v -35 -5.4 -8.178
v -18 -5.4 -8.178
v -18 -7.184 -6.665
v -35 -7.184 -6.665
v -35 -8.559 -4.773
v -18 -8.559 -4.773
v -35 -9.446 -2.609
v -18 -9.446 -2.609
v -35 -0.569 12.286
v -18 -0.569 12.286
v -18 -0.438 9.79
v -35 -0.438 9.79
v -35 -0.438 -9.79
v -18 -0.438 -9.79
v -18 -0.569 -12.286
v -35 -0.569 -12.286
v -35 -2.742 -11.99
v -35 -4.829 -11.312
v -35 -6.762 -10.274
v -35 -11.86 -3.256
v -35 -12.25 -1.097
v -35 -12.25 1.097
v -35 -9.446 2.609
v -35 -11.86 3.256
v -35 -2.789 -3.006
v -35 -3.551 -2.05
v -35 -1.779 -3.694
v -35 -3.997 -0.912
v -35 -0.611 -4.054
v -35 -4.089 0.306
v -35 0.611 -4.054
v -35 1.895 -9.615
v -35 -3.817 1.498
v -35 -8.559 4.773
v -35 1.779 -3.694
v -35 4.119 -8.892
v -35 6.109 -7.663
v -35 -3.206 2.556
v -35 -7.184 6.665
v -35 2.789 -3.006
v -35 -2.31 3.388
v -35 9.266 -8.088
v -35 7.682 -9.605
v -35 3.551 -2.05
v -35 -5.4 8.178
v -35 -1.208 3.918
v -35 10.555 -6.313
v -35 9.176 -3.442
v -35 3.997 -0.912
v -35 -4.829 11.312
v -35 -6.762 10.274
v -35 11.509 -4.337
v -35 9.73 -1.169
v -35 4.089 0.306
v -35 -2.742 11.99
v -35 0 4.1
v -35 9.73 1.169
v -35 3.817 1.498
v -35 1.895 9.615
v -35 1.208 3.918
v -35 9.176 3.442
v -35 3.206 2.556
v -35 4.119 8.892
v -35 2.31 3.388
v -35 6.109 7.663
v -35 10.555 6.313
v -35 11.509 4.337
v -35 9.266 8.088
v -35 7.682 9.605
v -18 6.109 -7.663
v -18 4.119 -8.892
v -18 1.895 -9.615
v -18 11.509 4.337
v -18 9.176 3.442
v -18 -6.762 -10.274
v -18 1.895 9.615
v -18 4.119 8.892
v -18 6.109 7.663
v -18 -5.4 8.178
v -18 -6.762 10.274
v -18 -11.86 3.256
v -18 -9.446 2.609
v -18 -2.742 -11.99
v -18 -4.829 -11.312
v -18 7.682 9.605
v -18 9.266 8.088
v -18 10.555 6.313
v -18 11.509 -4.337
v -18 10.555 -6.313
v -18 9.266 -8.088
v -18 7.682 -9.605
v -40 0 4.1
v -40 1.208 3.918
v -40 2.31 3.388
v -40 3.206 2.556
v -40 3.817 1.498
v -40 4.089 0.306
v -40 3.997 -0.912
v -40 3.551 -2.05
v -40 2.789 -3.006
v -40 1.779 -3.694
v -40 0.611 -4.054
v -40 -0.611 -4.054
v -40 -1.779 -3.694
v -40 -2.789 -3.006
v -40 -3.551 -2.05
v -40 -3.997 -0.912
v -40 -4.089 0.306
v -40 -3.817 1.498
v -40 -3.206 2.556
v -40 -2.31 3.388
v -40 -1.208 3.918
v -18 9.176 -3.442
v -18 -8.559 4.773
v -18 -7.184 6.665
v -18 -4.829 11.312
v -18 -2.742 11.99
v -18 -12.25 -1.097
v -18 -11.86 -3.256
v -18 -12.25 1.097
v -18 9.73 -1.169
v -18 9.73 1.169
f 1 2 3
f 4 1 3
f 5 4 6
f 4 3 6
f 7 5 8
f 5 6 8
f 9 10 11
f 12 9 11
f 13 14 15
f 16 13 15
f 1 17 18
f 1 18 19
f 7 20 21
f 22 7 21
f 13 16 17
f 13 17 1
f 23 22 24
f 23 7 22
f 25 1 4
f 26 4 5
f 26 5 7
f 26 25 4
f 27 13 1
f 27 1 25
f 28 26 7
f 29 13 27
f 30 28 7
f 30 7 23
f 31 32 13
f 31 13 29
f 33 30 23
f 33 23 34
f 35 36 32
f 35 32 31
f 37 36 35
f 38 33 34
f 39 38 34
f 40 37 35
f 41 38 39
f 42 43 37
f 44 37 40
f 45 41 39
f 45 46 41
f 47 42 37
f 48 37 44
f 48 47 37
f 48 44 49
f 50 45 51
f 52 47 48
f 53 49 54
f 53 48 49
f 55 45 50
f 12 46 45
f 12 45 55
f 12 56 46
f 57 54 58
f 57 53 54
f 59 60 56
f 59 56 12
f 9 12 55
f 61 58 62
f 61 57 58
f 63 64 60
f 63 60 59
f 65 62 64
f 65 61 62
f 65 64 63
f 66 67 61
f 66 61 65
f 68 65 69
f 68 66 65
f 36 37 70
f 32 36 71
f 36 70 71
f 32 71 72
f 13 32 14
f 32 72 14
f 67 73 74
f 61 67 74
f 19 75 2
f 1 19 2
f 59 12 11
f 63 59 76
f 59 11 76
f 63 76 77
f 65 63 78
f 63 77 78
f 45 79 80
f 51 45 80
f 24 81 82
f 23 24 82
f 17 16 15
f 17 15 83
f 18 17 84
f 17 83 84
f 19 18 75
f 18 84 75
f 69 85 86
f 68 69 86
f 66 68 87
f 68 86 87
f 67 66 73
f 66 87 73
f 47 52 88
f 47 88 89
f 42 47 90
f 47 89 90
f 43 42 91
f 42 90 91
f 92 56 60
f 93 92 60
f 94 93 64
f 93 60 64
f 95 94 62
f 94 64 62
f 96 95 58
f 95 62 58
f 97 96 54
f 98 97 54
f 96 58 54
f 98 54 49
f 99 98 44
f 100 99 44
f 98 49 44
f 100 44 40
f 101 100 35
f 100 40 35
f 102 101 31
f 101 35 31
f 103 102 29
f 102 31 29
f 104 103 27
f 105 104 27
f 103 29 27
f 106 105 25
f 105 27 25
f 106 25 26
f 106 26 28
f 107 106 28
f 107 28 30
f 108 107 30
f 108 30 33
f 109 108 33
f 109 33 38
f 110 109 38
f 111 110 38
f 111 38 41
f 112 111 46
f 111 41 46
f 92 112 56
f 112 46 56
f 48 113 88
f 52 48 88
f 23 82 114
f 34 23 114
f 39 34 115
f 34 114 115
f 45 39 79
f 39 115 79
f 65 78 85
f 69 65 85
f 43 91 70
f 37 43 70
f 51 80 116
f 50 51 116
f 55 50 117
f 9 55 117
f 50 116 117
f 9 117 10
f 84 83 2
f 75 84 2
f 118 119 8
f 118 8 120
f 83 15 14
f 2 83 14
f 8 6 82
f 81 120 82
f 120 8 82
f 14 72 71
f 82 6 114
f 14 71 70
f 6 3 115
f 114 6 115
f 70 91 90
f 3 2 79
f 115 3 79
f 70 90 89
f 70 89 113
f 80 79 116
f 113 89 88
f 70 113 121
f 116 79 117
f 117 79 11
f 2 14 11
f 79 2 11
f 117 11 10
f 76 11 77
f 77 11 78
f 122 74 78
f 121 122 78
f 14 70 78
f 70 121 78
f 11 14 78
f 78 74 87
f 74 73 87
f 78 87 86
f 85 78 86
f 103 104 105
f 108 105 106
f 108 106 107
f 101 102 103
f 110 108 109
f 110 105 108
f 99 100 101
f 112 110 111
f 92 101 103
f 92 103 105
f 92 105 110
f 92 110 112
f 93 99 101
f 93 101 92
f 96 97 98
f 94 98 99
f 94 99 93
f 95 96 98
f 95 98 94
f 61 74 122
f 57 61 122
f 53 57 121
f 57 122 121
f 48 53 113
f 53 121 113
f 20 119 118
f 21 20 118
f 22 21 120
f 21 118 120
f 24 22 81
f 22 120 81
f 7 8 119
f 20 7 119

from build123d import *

# Parameters (mm, degrees)
KEYEDBODY_DEPTH  = 17
SKETCH2_R        = 4.1
SMALLSHAFT_DEPTH = 5


with BuildPart() as part:
    # Sketch1 → KeyedBody (new body)
    with BuildSketch(Plane.ZY.offset(18)):
        with BuildLine():
            Line((-3.441775952, 9.17573857), (-4.337445486, 11.509037479))
            ThreePointArc((-4.337445486, 11.509037479), (-7.229313618, 9.950296561), (-9.605400723, 7.681643964))
            Line((-9.605400723, 7.681643964), (-7.663078698, 6.108782601))
            ThreePointArc((-7.663078698, 6.108782601), (-9.32035386, 3.028366545), (-9.790213218, -0.437864293))
            Line((-9.790213218, -0.437864293), (-12.286089458, -0.568667624))
            ThreePointArc((-12.286089458, -0.568667624), (-11.697275149, -3.800675088), (-10.273909609, -6.76152042))
            Line((-10.273909609, -6.76152042), (-8.177819046, -5.400303292))
            ThreePointArc((-8.177819046, -5.400303292), (-5.760295472, -7.928366545), (-2.608908574, -9.446353585))
            Line((-2.608908574, -9.446353585), (-3.255775388, -11.860493399))
            ThreePointArc((-3.255775388, -11.860493399), (0, -12.299242946), (3.255775388, -11.860493399))
            Line((3.255775388, -11.860493399), (2.608908574, -9.446353585))
            ThreePointArc((2.608908574, -9.446353585), (5.760295472, -7.928366545), (8.177819046, -5.400303292))
            Line((8.177819046, -5.400303292), (10.273909609, -6.76152042))
            ThreePointArc((10.273909609, -6.76152042), (11.697275149, -3.800675088), (12.286089458, -0.568667624))
            Line((12.286089458, -0.568667624), (9.790213218, -0.437864293))
            ThreePointArc((9.790213218, -0.437864293), (9.32035386, 3.028366545), (7.663078698, 6.108782601))
            Line((7.663078698, 6.108782601), (9.605400723, 7.681643964))
            ThreePointArc((9.605400723, 7.681643964), (7.229313618, 9.950296561), (4.337445486, 11.509037479))
            Line((4.337445486, 11.509037479), (3.441775952, 9.17573857))
            ThreePointArc((3.441775952, 9.17573857), (0, 9.8), (-3.441775952, 9.17573857))
        make_face()
    extrude(amount=KEYEDBODY_DEPTH)

    # Sketch2 → SmallShaft (add)
    with BuildSketch(Plane.ZY.offset(35)):
        Circle(SKETCH2_R)
    extrude(amount=SMALLSHAFT_DEPTH)


solid = part.part
